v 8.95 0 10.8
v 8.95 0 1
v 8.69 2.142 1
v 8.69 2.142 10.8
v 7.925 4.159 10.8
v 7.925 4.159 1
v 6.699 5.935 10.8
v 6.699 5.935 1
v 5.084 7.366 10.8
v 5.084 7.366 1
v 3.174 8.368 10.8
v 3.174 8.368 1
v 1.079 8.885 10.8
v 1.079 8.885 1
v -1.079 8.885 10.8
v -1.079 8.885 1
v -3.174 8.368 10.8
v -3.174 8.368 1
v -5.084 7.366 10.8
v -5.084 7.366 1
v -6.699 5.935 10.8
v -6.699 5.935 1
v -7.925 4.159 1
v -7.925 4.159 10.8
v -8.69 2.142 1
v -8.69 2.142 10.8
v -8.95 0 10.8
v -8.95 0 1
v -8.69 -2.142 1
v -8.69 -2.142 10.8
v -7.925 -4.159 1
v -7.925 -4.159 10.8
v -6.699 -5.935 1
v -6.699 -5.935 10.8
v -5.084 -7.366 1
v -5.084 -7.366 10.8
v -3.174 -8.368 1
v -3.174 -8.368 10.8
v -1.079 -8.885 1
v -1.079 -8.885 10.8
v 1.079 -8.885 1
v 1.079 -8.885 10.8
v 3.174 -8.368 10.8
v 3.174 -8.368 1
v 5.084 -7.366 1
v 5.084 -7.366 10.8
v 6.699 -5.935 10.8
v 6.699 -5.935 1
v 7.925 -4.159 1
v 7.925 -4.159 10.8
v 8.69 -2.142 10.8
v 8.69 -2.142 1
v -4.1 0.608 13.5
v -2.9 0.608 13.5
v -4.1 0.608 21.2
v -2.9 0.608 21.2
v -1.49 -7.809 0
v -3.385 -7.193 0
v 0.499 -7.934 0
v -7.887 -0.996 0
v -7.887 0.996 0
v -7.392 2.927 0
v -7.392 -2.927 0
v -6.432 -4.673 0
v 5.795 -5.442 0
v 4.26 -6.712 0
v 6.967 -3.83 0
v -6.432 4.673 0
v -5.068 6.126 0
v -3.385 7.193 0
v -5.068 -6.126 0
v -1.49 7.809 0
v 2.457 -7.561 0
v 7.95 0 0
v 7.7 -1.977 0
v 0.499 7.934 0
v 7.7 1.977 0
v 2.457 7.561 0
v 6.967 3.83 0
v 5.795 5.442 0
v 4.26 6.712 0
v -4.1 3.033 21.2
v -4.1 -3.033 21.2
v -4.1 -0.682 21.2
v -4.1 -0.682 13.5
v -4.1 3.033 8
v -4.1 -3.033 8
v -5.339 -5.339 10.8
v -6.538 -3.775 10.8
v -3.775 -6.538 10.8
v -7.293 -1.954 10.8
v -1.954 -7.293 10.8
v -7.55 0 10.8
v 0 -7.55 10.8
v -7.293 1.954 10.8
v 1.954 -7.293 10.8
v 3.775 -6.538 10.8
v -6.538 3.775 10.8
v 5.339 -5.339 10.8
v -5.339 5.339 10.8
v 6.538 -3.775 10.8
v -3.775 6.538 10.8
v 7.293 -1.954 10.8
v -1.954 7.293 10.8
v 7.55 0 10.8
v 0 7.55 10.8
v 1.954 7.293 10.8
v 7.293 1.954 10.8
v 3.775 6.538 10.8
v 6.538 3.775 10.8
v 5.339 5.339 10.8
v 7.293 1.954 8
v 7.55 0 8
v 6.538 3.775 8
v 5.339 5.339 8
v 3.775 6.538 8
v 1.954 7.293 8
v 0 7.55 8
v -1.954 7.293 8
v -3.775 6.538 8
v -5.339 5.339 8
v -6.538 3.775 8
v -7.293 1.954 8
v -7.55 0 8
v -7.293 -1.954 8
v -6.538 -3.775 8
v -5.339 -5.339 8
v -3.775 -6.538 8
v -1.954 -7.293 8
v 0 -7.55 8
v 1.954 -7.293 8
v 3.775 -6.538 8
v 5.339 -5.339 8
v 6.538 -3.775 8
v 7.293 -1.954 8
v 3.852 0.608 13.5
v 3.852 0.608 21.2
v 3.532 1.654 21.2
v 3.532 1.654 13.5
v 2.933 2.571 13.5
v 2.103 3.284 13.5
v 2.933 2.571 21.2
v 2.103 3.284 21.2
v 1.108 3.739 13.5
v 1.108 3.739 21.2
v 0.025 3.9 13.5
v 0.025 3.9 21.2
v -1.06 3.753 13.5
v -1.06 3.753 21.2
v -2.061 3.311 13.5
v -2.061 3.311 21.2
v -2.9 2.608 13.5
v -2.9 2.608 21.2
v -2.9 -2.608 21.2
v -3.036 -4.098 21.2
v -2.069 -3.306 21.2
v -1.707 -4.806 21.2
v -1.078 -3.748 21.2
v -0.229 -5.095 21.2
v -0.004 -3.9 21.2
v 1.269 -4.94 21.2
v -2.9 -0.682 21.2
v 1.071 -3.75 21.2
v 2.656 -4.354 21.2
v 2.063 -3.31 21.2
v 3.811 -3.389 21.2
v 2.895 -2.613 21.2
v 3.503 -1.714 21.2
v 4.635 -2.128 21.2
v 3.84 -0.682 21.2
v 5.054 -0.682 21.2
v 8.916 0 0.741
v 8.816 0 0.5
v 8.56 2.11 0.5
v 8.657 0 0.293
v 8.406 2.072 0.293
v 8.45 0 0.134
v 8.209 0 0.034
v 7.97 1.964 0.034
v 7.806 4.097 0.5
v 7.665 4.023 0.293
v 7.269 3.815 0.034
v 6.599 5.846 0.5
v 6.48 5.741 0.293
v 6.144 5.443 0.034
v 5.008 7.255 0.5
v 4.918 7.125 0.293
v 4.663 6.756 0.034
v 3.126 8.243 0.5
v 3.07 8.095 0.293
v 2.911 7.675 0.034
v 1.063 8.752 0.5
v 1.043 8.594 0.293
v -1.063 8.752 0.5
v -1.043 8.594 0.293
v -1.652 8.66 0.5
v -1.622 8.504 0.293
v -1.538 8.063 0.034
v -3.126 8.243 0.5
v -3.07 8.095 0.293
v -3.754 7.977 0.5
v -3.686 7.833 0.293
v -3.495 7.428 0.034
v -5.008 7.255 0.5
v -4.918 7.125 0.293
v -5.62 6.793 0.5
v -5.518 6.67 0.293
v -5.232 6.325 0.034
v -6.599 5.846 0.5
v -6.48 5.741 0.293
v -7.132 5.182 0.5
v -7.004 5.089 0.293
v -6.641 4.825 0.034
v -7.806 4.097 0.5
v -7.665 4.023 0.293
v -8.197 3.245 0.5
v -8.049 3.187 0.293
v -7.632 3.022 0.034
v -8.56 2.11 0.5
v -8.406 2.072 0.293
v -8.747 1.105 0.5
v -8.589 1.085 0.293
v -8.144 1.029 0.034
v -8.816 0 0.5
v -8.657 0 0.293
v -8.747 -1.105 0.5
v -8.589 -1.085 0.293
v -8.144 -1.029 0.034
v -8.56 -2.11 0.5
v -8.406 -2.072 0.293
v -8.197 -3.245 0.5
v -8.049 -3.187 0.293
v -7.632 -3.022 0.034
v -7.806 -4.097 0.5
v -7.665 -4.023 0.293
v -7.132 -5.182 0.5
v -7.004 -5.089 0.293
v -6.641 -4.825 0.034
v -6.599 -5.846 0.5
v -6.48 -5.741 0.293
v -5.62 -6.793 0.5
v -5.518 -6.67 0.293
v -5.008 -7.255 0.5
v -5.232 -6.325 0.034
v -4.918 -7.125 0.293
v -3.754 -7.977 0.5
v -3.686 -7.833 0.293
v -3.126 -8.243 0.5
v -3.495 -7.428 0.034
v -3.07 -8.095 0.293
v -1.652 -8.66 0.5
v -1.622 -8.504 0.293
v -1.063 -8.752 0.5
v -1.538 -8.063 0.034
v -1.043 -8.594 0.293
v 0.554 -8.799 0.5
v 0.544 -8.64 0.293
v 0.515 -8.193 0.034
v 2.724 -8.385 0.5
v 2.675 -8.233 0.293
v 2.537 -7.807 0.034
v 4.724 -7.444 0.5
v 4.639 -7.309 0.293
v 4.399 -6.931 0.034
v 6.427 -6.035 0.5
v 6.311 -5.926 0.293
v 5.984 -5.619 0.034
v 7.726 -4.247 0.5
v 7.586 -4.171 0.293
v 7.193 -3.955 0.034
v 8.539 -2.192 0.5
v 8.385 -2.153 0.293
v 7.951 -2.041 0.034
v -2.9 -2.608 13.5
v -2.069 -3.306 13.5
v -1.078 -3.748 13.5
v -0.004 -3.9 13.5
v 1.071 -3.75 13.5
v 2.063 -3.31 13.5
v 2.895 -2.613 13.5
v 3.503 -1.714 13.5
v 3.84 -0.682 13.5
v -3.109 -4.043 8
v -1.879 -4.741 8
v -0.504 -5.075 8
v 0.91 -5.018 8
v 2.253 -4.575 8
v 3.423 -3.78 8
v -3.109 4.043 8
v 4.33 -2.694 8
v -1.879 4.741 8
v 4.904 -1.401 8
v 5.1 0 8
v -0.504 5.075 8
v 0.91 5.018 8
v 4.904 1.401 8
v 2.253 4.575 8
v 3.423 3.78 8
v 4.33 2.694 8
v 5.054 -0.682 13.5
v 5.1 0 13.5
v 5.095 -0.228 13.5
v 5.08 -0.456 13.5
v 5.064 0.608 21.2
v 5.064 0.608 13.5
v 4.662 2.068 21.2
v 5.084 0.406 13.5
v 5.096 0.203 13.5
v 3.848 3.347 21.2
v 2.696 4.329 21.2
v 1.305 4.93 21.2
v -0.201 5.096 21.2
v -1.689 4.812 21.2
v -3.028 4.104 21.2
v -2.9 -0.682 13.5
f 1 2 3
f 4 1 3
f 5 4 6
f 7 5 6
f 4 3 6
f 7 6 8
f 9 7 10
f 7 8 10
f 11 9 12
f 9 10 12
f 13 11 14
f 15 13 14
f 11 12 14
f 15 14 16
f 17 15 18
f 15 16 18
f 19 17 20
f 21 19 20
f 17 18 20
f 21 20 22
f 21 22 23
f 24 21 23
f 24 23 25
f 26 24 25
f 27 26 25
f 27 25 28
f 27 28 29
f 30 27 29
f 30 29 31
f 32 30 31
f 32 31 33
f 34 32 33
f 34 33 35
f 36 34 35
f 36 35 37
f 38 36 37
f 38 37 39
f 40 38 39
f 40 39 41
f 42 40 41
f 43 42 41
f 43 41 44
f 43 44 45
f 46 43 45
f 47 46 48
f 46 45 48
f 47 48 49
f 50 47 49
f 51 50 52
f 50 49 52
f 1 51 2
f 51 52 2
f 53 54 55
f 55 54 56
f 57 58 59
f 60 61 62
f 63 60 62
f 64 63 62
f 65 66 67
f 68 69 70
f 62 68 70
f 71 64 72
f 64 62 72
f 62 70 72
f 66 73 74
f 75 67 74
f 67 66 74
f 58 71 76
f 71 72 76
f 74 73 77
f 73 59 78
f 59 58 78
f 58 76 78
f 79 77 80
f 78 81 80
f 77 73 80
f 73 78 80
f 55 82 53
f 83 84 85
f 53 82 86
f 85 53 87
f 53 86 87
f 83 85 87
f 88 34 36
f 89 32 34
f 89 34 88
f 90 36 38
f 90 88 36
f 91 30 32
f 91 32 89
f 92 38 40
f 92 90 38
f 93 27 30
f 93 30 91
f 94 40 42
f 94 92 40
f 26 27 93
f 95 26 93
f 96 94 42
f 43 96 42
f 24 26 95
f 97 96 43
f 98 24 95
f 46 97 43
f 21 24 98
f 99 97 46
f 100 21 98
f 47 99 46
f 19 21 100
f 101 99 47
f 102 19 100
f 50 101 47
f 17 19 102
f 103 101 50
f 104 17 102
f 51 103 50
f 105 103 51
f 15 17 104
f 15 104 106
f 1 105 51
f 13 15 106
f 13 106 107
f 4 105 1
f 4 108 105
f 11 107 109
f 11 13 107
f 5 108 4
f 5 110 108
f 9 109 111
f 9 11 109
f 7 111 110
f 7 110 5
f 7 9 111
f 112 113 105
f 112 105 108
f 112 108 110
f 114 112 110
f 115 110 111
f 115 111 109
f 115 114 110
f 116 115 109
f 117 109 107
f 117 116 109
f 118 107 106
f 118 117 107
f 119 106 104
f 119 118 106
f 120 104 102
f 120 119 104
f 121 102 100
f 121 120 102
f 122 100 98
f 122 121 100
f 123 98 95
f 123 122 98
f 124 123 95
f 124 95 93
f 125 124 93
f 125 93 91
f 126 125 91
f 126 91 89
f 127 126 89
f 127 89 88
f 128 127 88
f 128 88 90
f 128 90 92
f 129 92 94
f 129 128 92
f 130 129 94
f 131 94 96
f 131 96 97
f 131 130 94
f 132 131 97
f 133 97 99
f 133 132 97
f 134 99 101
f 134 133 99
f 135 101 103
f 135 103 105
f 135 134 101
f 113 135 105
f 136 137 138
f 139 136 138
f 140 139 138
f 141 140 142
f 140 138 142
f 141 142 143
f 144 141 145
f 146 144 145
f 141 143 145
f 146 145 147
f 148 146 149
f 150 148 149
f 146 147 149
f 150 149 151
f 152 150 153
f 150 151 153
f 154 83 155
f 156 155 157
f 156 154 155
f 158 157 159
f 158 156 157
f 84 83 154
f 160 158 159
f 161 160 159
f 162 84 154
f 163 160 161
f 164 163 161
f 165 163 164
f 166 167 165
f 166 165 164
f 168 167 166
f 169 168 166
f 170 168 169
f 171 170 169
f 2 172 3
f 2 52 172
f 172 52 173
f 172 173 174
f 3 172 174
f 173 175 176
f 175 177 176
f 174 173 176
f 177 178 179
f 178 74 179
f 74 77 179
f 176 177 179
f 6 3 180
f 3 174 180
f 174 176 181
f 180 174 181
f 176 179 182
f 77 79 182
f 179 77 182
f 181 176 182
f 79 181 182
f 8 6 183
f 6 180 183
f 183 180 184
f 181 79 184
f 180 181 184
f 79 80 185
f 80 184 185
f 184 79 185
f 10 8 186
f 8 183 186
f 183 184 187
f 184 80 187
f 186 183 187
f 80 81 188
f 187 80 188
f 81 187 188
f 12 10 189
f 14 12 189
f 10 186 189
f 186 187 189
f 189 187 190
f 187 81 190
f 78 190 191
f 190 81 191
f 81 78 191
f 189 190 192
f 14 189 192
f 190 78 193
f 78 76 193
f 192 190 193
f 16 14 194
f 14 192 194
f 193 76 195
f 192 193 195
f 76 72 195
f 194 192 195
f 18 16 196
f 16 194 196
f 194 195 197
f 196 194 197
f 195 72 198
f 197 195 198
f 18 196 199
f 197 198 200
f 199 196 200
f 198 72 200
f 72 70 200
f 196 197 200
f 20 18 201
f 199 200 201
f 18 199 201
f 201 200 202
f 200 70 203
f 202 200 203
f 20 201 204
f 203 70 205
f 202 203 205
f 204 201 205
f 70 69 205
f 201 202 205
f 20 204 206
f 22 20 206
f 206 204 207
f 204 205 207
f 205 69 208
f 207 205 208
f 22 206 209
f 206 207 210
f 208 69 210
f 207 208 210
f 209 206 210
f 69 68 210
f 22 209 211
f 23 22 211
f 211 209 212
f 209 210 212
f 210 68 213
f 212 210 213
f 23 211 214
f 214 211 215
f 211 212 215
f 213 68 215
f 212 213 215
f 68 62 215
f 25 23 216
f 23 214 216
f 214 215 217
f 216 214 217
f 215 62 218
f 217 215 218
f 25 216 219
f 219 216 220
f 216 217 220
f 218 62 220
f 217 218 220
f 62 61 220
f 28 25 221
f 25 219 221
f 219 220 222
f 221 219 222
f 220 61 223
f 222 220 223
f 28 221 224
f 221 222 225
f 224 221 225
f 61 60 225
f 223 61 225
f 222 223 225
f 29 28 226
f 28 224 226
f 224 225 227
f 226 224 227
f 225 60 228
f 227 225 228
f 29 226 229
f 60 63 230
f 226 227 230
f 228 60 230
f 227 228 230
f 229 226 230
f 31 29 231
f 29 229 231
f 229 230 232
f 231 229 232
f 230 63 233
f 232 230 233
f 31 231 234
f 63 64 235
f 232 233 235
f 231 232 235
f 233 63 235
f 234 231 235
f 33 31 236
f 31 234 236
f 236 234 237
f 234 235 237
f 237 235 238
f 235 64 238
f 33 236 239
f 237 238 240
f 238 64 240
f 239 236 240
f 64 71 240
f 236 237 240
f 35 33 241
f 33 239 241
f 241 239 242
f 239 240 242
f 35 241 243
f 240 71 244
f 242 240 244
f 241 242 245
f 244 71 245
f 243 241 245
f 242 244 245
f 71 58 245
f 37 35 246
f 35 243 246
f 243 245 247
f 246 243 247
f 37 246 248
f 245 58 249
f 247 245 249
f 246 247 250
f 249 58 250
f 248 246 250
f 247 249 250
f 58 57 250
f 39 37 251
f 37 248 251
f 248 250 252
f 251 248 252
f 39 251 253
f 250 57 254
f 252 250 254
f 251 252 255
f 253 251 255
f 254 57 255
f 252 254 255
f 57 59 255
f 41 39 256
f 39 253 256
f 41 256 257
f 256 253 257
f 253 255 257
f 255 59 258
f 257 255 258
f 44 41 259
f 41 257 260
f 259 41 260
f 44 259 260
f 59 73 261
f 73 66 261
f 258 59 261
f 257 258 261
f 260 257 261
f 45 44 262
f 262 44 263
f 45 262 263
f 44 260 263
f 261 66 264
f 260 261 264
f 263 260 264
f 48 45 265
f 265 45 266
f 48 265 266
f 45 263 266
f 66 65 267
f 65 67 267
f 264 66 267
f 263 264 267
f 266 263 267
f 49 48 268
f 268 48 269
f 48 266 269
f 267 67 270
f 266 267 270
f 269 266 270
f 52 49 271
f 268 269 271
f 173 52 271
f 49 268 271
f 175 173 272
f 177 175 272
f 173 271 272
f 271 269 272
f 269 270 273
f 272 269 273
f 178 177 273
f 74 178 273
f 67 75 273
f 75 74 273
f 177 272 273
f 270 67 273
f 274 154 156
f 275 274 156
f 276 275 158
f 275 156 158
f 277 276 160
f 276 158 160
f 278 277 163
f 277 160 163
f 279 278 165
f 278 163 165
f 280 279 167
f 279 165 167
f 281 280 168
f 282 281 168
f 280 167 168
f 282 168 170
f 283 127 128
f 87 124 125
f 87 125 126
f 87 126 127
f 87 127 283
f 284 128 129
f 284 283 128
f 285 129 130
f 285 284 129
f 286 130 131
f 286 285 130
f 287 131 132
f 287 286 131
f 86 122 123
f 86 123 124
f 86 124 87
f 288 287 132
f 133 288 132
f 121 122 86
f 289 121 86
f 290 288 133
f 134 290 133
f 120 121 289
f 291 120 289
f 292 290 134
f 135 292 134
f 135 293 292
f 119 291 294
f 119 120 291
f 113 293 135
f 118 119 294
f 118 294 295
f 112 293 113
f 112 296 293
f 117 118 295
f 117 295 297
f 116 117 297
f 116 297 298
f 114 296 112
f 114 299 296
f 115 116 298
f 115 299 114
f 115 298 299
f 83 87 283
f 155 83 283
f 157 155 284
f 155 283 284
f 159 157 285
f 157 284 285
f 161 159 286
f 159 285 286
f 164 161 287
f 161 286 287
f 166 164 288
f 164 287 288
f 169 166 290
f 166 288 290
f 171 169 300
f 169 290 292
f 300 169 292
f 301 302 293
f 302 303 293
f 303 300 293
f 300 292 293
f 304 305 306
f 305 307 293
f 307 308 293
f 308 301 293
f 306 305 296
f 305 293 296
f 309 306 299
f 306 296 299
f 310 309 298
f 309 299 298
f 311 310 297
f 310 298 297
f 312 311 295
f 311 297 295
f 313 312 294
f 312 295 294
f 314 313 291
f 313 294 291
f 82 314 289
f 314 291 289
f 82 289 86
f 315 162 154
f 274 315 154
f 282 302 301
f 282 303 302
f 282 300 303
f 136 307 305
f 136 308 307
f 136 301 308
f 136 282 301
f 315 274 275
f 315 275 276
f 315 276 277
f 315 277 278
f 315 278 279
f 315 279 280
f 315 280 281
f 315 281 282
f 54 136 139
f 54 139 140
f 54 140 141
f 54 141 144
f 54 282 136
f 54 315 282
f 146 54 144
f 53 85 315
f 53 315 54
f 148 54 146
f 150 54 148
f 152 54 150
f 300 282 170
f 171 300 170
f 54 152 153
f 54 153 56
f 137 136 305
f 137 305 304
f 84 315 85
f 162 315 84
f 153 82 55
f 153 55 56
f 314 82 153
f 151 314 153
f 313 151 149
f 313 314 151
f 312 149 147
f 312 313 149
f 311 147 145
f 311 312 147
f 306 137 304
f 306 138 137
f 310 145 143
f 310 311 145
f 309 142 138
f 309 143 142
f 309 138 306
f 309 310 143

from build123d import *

# Parameters (mm, degrees)
F0_R           = 8.95
F1_DEPTH       = 8
F2_R           = 8.95
F2_R_2         = 7.55
F3_DEPTH       = 2.8
F5_DEPTH       = 13.2
F6_R           = 1
F8_DEPTH       = 7.7
F9_W           = 1.29
F9_H           = 7.7
F10_DEPTH      = 1.5
F10_DEPTH_BACK = 8


with BuildPart() as f1:
    # F0 (on Top) → F1 (new body)
    with BuildSketch(Plane.XY):
        Circle(F0_R)
    extrude(amount=F1_DEPTH)

    # F2 (on face) → F3 (join)
    with BuildSketch(Plane.XY.offset(8)):
        Circle(F2_R)
        Circle(F2_R_2, mode=Mode.SUBTRACT)
    extrude(amount=F3_DEPTH)

    # F4 (on face) → F5 (join)
    with BuildSketch(Plane.XY.offset(8)):
        with BuildLine():
            ThreePointArc((-4.1, -3.0331501776), (1.5968719423, -4.8435524153), (5.1, 0))
            ThreePointArc((5.1, 0), (1.5968719423, 4.8435524153), (-4.1, 3.0331501776))
            Line((-4.1, 3.0331501776), (-4.1, -3.0331501776))
        make_face()
    extrude(amount=F5_DEPTH)

    # F6
    f6_edges = [f1.edges().sort_by_distance(p)[0] for p in [
        (-8.95, 0, 0),
    ]]
    fillet(f6_edges, radius=F6_R)

    # F7 (on face) → F8 (cut)
    with BuildSketch(Plane.XY.offset(21.2)):
        with BuildLine():
            Line((-2.9, 2.6076809621), (-2.9, -2.6076809621))
            ThreePointArc((-2.9, -2.6076809621), (3.9, 0), (-2.9, 2.6076809621))
        make_face()
    extrude(amount=-F8_DEPTH, mode=Mode.SUBTRACT)

    # F9 (on face) → F10 (cut, two sides)
    with BuildSketch(Plane.YZ.offset(-2.9)) as f10_sk:
        with Locations((-0.0373190379, 17.35)):
            Rectangle(F9_W, F9_H)
    extrude(amount=-F10_DEPTH, mode=Mode.SUBTRACT)
    extrude(f10_sk.sketch, amount=F10_DEPTH_BACK, mode=Mode.SUBTRACT)


solid = f1.part
